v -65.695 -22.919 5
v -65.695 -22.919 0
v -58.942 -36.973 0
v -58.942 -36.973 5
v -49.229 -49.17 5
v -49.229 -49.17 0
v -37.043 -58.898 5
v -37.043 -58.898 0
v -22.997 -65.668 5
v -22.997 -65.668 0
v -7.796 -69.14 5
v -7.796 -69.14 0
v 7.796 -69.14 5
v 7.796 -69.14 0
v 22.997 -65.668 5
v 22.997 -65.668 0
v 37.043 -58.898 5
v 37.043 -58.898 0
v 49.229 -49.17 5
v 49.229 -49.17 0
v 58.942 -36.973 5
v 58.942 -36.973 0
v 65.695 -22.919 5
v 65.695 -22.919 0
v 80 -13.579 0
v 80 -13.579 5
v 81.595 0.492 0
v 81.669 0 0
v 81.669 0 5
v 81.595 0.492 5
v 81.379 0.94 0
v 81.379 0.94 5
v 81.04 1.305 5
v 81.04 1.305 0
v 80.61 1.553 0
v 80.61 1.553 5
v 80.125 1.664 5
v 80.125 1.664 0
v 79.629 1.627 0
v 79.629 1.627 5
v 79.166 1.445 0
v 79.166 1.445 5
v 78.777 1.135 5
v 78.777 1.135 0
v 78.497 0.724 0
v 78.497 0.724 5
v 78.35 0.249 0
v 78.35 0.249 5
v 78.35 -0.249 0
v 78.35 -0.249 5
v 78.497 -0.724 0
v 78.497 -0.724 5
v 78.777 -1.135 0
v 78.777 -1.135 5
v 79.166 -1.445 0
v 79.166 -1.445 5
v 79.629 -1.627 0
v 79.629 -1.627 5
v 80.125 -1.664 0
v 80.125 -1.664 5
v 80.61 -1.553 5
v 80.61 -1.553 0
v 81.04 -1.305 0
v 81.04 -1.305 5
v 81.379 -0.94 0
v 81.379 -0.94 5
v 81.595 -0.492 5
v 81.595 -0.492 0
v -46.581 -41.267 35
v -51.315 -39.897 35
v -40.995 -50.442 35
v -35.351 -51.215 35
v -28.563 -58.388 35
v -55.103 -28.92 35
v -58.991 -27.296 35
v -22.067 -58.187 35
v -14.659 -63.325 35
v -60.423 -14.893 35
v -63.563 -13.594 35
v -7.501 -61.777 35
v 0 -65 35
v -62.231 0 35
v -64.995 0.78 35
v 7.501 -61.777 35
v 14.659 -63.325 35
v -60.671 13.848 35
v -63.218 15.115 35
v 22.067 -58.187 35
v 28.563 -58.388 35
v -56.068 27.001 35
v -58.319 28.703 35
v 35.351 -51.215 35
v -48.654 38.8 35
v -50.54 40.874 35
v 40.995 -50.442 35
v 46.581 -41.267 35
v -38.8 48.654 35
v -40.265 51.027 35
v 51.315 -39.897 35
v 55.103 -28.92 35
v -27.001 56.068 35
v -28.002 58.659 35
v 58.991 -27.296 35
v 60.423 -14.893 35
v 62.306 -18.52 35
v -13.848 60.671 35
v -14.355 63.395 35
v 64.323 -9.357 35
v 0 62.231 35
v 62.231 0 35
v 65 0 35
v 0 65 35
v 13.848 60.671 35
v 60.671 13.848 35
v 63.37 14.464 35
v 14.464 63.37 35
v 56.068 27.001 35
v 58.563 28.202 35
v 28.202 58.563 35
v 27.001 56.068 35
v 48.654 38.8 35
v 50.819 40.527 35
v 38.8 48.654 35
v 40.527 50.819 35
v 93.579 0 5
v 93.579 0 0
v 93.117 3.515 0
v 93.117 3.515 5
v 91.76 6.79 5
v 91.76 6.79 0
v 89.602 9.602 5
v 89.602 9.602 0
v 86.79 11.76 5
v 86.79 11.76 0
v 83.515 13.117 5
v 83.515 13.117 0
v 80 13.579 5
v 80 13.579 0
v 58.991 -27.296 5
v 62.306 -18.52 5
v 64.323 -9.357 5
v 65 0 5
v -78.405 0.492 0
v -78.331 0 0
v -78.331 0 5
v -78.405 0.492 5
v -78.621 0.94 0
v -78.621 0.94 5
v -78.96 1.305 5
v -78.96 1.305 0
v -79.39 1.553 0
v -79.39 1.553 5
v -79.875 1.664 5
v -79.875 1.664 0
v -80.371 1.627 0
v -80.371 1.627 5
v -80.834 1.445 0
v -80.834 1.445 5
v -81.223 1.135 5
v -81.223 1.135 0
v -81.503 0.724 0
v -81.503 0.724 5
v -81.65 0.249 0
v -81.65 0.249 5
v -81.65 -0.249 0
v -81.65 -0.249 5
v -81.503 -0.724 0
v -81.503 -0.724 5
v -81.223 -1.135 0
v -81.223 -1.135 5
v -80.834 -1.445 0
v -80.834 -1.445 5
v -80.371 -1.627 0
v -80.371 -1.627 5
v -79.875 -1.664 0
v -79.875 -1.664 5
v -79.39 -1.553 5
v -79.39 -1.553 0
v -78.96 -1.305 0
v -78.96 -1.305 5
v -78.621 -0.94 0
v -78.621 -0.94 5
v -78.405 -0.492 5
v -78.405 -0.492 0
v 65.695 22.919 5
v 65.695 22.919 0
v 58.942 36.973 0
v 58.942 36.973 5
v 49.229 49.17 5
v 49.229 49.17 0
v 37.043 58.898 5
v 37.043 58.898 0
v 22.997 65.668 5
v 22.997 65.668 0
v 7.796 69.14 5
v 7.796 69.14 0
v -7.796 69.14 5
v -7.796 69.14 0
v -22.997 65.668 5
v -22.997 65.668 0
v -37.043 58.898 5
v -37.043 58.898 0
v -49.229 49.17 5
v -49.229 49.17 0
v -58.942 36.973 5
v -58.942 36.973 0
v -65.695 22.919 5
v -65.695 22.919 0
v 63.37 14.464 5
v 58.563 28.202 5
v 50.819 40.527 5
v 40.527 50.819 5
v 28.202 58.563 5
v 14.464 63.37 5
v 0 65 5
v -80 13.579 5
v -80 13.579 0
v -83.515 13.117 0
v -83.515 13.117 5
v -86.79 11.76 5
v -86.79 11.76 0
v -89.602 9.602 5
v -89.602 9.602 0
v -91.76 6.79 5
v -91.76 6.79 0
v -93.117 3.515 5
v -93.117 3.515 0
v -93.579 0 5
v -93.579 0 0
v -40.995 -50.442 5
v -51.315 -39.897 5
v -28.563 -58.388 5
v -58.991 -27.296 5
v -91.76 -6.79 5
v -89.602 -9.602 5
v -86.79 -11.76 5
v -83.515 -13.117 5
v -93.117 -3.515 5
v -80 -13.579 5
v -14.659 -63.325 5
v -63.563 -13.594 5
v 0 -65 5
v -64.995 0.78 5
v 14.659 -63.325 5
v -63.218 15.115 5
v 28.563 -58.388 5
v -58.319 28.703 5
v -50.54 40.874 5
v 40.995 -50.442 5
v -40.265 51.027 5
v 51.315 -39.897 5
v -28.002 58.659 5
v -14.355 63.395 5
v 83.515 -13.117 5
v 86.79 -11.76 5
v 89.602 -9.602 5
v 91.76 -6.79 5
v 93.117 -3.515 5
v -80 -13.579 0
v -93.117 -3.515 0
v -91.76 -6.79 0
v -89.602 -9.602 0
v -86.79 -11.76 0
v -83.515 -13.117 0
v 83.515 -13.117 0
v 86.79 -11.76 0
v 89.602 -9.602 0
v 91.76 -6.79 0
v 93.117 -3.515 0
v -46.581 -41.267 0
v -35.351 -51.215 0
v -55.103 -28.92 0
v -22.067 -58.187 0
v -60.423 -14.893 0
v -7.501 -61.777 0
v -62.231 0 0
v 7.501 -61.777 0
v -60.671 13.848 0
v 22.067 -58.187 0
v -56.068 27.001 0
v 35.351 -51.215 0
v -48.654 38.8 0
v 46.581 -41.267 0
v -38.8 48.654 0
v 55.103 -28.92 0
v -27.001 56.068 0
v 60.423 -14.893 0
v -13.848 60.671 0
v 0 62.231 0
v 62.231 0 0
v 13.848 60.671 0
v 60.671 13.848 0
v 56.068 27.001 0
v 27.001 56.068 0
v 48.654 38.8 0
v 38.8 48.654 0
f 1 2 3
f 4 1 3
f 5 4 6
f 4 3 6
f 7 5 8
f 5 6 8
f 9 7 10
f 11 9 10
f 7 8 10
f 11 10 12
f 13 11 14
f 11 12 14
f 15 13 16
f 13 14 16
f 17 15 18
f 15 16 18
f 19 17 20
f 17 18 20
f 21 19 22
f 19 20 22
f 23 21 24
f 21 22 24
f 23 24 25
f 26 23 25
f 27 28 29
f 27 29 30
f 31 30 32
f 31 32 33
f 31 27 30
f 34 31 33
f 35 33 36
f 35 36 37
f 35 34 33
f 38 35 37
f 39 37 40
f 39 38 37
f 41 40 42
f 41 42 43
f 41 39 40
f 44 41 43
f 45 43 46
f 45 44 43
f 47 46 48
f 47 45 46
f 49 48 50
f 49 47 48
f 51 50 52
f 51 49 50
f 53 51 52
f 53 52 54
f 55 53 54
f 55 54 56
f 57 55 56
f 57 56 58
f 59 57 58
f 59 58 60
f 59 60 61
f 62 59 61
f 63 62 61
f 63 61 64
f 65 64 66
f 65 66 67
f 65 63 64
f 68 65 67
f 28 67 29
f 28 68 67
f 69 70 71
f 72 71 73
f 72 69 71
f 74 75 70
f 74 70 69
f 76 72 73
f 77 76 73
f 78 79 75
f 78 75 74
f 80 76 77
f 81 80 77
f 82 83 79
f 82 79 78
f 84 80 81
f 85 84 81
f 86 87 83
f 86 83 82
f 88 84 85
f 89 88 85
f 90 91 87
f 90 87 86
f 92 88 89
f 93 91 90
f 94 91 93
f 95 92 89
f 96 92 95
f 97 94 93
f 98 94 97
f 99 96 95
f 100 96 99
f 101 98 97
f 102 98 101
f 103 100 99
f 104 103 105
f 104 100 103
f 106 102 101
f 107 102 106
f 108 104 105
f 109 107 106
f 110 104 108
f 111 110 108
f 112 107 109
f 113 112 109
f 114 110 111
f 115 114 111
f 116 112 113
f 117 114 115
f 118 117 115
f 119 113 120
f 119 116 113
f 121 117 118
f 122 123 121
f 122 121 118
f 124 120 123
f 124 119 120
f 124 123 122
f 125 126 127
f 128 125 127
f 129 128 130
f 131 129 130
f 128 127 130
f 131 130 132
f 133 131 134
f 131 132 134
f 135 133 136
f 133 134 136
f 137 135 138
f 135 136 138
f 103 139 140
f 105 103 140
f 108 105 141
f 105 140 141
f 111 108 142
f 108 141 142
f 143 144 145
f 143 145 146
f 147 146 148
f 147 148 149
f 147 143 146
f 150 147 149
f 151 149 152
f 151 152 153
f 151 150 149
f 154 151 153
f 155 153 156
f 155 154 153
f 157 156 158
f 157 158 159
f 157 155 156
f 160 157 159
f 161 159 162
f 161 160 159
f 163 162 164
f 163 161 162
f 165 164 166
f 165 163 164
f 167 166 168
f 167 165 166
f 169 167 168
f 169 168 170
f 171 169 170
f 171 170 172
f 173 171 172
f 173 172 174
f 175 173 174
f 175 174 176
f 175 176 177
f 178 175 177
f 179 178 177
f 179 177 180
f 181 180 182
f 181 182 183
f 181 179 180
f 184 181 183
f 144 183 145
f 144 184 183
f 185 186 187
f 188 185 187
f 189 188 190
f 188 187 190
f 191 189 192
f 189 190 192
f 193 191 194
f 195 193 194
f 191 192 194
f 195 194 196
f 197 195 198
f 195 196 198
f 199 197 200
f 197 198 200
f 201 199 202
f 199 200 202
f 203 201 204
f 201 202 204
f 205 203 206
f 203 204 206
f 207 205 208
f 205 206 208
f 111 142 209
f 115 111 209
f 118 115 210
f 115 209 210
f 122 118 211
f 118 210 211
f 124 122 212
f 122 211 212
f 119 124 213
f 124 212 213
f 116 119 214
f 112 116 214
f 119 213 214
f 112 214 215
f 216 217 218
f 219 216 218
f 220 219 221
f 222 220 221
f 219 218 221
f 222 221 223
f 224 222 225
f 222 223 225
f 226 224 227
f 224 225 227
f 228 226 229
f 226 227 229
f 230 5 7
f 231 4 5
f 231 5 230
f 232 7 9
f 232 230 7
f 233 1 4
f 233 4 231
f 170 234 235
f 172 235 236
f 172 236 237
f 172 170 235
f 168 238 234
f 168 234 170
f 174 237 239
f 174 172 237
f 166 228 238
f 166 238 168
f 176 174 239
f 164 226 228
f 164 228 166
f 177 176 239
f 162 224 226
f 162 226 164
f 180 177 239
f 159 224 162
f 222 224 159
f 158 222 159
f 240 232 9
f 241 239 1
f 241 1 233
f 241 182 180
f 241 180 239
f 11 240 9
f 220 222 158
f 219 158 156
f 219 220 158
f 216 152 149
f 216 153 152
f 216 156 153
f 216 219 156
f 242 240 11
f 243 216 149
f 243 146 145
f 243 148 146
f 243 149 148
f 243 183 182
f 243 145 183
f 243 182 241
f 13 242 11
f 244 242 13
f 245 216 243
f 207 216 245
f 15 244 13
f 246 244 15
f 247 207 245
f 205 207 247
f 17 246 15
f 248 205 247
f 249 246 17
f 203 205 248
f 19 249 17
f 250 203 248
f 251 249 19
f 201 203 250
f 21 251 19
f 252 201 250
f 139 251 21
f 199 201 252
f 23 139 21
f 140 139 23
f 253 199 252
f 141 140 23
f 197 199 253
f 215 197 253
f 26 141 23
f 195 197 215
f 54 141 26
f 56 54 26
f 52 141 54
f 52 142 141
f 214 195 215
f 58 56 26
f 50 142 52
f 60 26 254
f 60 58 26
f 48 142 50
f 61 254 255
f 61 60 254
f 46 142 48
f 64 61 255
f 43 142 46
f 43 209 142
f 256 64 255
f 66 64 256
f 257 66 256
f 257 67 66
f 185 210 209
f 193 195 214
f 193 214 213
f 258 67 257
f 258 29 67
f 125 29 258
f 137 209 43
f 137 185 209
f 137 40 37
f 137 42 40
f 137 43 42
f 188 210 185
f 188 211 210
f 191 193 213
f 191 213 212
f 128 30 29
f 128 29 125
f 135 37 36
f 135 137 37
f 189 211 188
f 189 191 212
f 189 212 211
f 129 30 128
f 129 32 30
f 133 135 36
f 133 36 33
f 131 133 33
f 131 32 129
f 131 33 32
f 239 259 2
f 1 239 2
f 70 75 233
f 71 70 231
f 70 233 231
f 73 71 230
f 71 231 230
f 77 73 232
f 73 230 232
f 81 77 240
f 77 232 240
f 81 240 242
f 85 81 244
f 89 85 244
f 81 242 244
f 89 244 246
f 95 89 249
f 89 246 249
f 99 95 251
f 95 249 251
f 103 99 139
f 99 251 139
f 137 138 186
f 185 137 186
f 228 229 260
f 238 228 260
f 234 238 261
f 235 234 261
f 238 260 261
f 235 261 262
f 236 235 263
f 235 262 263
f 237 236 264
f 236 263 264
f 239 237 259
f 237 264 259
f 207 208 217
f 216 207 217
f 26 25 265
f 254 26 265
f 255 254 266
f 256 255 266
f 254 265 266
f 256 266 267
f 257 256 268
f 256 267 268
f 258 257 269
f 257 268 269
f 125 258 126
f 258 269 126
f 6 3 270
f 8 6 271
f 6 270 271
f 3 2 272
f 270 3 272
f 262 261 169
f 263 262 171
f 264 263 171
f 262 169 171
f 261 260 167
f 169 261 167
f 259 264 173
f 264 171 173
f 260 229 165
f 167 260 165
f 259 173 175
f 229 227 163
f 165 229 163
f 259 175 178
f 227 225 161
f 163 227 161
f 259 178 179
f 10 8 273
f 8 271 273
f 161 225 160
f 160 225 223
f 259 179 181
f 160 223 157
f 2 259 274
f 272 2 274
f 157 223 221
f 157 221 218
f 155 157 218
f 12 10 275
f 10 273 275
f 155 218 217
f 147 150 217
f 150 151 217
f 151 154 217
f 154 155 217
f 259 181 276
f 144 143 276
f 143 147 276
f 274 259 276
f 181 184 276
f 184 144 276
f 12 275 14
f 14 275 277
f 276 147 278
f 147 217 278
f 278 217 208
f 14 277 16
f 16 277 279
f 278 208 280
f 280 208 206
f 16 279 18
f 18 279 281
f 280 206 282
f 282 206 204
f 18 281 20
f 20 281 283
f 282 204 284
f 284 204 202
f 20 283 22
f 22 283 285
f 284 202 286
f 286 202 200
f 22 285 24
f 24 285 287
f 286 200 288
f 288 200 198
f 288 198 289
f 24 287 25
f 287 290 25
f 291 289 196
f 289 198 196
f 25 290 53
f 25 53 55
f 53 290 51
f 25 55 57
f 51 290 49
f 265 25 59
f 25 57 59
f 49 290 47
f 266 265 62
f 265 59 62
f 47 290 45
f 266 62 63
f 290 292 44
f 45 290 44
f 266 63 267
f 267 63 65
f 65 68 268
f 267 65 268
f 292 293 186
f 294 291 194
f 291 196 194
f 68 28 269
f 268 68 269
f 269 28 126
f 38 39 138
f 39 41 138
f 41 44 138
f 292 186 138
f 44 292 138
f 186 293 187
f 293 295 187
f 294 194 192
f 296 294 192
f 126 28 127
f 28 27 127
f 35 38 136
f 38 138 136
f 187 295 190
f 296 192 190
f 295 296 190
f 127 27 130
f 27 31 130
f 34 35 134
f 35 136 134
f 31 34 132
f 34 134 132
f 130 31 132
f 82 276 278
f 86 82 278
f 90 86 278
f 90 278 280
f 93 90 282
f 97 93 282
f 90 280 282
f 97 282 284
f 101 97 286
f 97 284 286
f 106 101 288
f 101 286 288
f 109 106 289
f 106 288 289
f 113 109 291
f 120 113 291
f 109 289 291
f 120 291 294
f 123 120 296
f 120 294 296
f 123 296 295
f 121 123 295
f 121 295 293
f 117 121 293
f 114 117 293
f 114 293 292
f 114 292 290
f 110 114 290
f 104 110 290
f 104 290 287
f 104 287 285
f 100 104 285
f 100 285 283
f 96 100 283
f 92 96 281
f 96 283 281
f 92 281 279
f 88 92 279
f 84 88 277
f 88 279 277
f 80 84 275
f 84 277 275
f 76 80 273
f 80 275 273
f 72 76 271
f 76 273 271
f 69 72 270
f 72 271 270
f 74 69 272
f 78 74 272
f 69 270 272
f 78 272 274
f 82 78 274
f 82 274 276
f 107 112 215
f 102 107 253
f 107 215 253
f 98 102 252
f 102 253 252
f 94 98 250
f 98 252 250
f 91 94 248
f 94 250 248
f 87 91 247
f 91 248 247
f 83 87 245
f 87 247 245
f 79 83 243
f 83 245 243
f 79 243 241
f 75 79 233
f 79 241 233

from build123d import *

# Parameters (mm, degrees)
F1_DEPTH = 5
F0_R     = 1.6686337588
F2_DEPTH = 5
F3_DEPTH = 35


with BuildPart() as f1:
    # F0 (on Top) → F1 (new body)
    with BuildSketch(Plane.XY):
        with BuildLine():
            ThreePointArc((58.9908692784, -27.2961048829), (63.4799436952, -13.9748613035), (65, 0))
            ThreePointArc((65, 0), (63.4799436952, 13.9748613035), (58.9908692784, 27.2961048829))
            ThreePointArc((58.9908692784, 27.2961048829), (35.0053794624, 54.7688178501), (0, 65))
            ThreePointArc((0, 65), (-35.0053794624, 54.7688178501), (-58.9908692784, 27.2961048829))
            ThreePointArc((-58.9908692784, 27.2961048829), (-63.4799436952, 13.9748613035), (-65, 0))
            ThreePointArc((-65, 0), (-63.4799436952, -13.9748613035), (-58.9908692784, -27.2961048829))
            ThreePointArc((-58.9908692784, -27.2961048829), (0, -65), (58.9908692784, -27.2961048829))
        make_face()
        with BuildLine():
            ThreePointArc((-62.231150434, 0), (-44.0040684729, 44.0040684729), (0, 62.231150434))
            ThreePointArc((0, 62.231150434), (44.0040684729, 44.0040684729), (62.231150434, 0))
            ThreePointArc((62.231150434, 0), (0, -62.231150434), (-62.231150434, 0))
        make_face(mode=Mode.SUBTRACT)
        with BuildLine():
            ThreePointArc((58.9908692784, 27.2961048829), (63.4799436952, 13.9748613035), (65, 0))
            Line((65, 0), (66.4206601738, 0))
            ThreePointArc((66.4206601738, 0), (67.1091179562, 4.268914411), (69.1046831796, 8.1049701726))
            ThreePointArc((69.1046831796, 8.1049701726), (67.8057771791, 15.6052670592), (65.6953330705, 22.9187912336))
            Line((65.6953330705, 22.9187912336), (58.9908692784, 27.2961048829))
        make_face()
        with BuildLine():
            Line((66.4206601738, 0), (65, 0))
            ThreePointArc((65, 0), (63.4799436952, -13.9748613035), (58.9908692784, -27.2961048829))
            Line((58.9908692784, -27.2961048829), (65.6953330705, -22.9187912336))
            ThreePointArc((65.6953330705, -22.9187912336), (67.8057771791, -15.6052670592), (69.1046831796, -8.1049701726))
            ThreePointArc((69.1046831796, -8.1049701726), (67.1091179562, -4.268914411), (66.4206601738, 0))
        make_face()
        with BuildLine():
            ThreePointArc((0, 65), (35.0053794624, 54.7688178501), (58.9908692784, 27.2961048829))
            Line((58.9908692784, 27.2961048829), (65.6953330705, 22.9187912336))
            ThreePointArc((65.6953330705, 22.9187912336), (0, 69.5783571152), (-65.6953330705, 22.9187912336))
            Line((-65.6953330705, 22.9187912336), (-58.9908692784, 27.2961048829))
            ThreePointArc((-58.9908692784, 27.2961048829), (-35.0053794624, 54.7688178501), (0, 65))
        make_face()
        with BuildLine():
            ThreePointArc((69.1046831796, 8.1049701726), (67.1091179562, 4.268914411), (66.4206601738, 0))
            ThreePointArc((66.4206601738, 0), (67.1091179562, -4.268914411), (69.1046831796, -8.1049701726))
            ThreePointArc((69.1046831796, -8.1049701726), (69.4598376886, -4.0593998478), (69.5783571152, 0))
            ThreePointArc((69.5783571152, 0), (69.4598376886, 4.0593998478), (69.1046831796, 8.1049701726))
        make_face()
        with BuildLine():
            Line((65.6953330705, -22.9187912336), (58.9908692784, -27.2961048829))
            ThreePointArc((58.9908692784, -27.2961048829), (0, -65), (-58.9908692784, -27.2961048829))
            Line((-58.9908692784, -27.2961048829), (-65.6953330705, -22.9187912336))
            ThreePointArc((-65.6953330705, -22.9187912336), (0, -69.5783571152), (65.6953330705, -22.9187912336))
        make_face()
        with BuildLine():
            Line((-65.6953330705, -22.9187912336), (-58.9908692784, -27.2961048829))
            ThreePointArc((-58.9908692784, -27.2961048829), (-63.4799436952, -13.9748613035), (-65, 0))
            Line((-65, 0), (-66.4206601738, 0))
            ThreePointArc((-66.4206601738, 0), (-67.1091179562, -4.268914411), (-69.1046831796, -8.1049701726))
            ThreePointArc((-69.1046831796, -8.1049701726), (-67.8057771791, -15.6052670592), (-65.6953330705, -22.9187912336))
        make_face()
        with BuildLine():
            ThreePointArc((-65, 0), (-63.4799436952, 13.9748613035), (-58.9908692784, 27.2961048829))
            Line((-58.9908692784, 27.2961048829), (-65.6953330705, 22.9187912336))
            ThreePointArc((-65.6953330705, 22.9187912336), (-67.8057771791, 15.6052670592), (-69.1046831796, 8.1049701726))
            ThreePointArc((-69.1046831796, 8.1049701726), (-67.1091179562, 4.268914411), (-66.4206601738, 0))
            Line((-66.4206601738, 0), (-65, 0))
        make_face()
        with BuildLine():
            ThreePointArc((-66.4206601738, 0), (-67.1091179562, 4.268914411), (-69.1046831796, 8.1049701726))
            ThreePointArc((-69.1046831796, 8.1049701726), (-69.5783571152, 0), (-69.1046831796, -8.1049701726))
            ThreePointArc((-69.1046831796, -8.1049701726), (-67.1091179562, -4.268914411), (-66.4206601738, 0))
        make_face()
    extrude(amount=F1_DEPTH)

    # F0 (on Top) → F2 (join)
    with BuildSketch(Plane.XY):
        with BuildLine():
            ThreePointArc((-69.1046831796, 8.1049701726), (-67.8057771791, 15.6052670592), (-65.6953330705, 22.9187912336))
            Line((-65.6953330705, 22.9187912336), (-80, 13.5793398262))
            ThreePointArc((-80, 13.5793398262), (-73.9033482197, 12.133808437), (-69.1046831796, 8.1049701726))
        make_face()
        with BuildLine():
            ThreePointArc((-69.1046831796, 8.1049701726), (-73.9033482197, 12.133808437), (-80, 13.5793398262))
            ThreePointArc((-80, 13.5793398262), (-89.6020432751, 9.6020432751), (-93.5793398262, 0))
            ThreePointArc((-93.5793398262, 0), (-89.6020432751, -9.6020432751), (-80, -13.5793398262))
            ThreePointArc((-80, -13.5793398262), (-73.9033482197, -12.133808437), (-69.1046831796, -8.1049701726))
            ThreePointArc((-69.1046831796, -8.1049701726), (-69.5783571152, 0), (-69.1046831796, 8.1049701726))
        make_face()
        with Locations((-80, 0)):
            Circle(F0_R, mode=Mode.SUBTRACT)
        with BuildLine():
            Line((-80, -13.5793398262), (-65.6953330705, -22.9187912336))
            ThreePointArc((-65.6953330705, -22.9187912336), (-67.8057771791, -15.6052670592), (-69.1046831796, -8.1049701726))
            ThreePointArc((-69.1046831796, -8.1049701726), (-73.9033482197, -12.133808437), (-80, -13.5793398262))
        make_face()
        with BuildLine():
            ThreePointArc((80, -13.5793398262), (73.9033482197, -12.133808437), (69.1046831796, -8.1049701726))
            ThreePointArc((69.1046831796, -8.1049701726), (67.8057771791, -15.6052670592), (65.6953330705, -22.9187912336))
            Line((65.6953330705, -22.9187912336), (80, -13.5793398262))
        make_face()
        with BuildLine():
            ThreePointArc((80, 13.5793398262), (73.9033482197, 12.133808437), (69.1046831796, 8.1049701726))
            ThreePointArc((69.1046831796, 8.1049701726), (69.4598376886, 4.0593998478), (69.5783571152, 0))
            ThreePointArc((69.5783571152, 0), (69.4598376886, -4.0593998478), (69.1046831796, -8.1049701726))
            ThreePointArc((69.1046831796, -8.1049701726), (73.9033482197, -12.133808437), (80, -13.5793398262))
            ThreePointArc((80, -13.5793398262), (89.6020432751, -9.6020432751), (93.5793398262, 0))
            ThreePointArc((93.5793398262, 0), (89.6020432751, 9.6020432751), (80, 13.5793398262))
        make_face()
        with Locations((80, 0)):
            Circle(F0_R, mode=Mode.SUBTRACT)
        with BuildLine():
            Line((80, 13.5793398262), (65.6953330705, 22.9187912336))
            ThreePointArc((65.6953330705, 22.9187912336), (67.8057771791, 15.6052670592), (69.1046831796, 8.1049701726))
            ThreePointArc((69.1046831796, 8.1049701726), (73.9033482197, 12.133808437), (80, 13.5793398262))
        make_face()
    extrude(amount=F2_DEPTH)

    # F0 (on Top) → F3 (join)
    with BuildSketch(Plane.XY):
        with BuildLine():
            ThreePointArc((58.9908692784, -27.2961048829), (63.4799436952, -13.9748613035), (65, 0))
            ThreePointArc((65, 0), (63.4799436952, 13.9748613035), (58.9908692784, 27.2961048829))
            ThreePointArc((58.9908692784, 27.2961048829), (35.0053794624, 54.7688178501), (0, 65))
            ThreePointArc((0, 65), (-35.0053794624, 54.7688178501), (-58.9908692784, 27.2961048829))
            ThreePointArc((-58.9908692784, 27.2961048829), (-63.4799436952, 13.9748613035), (-65, 0))
            ThreePointArc((-65, 0), (-63.4799436952, -13.9748613035), (-58.9908692784, -27.2961048829))
            ThreePointArc((-58.9908692784, -27.2961048829), (0, -65), (58.9908692784, -27.2961048829))
        make_face()
        with BuildLine():
            ThreePointArc((-62.231150434, 0), (-44.0040684729, 44.0040684729), (0, 62.231150434))
            ThreePointArc((0, 62.231150434), (44.0040684729, 44.0040684729), (62.231150434, 0))
            ThreePointArc((62.231150434, 0), (0, -62.231150434), (-62.231150434, 0))
        make_face(mode=Mode.SUBTRACT)
    extrude(amount=F3_DEPTH)


solid = f1.part
